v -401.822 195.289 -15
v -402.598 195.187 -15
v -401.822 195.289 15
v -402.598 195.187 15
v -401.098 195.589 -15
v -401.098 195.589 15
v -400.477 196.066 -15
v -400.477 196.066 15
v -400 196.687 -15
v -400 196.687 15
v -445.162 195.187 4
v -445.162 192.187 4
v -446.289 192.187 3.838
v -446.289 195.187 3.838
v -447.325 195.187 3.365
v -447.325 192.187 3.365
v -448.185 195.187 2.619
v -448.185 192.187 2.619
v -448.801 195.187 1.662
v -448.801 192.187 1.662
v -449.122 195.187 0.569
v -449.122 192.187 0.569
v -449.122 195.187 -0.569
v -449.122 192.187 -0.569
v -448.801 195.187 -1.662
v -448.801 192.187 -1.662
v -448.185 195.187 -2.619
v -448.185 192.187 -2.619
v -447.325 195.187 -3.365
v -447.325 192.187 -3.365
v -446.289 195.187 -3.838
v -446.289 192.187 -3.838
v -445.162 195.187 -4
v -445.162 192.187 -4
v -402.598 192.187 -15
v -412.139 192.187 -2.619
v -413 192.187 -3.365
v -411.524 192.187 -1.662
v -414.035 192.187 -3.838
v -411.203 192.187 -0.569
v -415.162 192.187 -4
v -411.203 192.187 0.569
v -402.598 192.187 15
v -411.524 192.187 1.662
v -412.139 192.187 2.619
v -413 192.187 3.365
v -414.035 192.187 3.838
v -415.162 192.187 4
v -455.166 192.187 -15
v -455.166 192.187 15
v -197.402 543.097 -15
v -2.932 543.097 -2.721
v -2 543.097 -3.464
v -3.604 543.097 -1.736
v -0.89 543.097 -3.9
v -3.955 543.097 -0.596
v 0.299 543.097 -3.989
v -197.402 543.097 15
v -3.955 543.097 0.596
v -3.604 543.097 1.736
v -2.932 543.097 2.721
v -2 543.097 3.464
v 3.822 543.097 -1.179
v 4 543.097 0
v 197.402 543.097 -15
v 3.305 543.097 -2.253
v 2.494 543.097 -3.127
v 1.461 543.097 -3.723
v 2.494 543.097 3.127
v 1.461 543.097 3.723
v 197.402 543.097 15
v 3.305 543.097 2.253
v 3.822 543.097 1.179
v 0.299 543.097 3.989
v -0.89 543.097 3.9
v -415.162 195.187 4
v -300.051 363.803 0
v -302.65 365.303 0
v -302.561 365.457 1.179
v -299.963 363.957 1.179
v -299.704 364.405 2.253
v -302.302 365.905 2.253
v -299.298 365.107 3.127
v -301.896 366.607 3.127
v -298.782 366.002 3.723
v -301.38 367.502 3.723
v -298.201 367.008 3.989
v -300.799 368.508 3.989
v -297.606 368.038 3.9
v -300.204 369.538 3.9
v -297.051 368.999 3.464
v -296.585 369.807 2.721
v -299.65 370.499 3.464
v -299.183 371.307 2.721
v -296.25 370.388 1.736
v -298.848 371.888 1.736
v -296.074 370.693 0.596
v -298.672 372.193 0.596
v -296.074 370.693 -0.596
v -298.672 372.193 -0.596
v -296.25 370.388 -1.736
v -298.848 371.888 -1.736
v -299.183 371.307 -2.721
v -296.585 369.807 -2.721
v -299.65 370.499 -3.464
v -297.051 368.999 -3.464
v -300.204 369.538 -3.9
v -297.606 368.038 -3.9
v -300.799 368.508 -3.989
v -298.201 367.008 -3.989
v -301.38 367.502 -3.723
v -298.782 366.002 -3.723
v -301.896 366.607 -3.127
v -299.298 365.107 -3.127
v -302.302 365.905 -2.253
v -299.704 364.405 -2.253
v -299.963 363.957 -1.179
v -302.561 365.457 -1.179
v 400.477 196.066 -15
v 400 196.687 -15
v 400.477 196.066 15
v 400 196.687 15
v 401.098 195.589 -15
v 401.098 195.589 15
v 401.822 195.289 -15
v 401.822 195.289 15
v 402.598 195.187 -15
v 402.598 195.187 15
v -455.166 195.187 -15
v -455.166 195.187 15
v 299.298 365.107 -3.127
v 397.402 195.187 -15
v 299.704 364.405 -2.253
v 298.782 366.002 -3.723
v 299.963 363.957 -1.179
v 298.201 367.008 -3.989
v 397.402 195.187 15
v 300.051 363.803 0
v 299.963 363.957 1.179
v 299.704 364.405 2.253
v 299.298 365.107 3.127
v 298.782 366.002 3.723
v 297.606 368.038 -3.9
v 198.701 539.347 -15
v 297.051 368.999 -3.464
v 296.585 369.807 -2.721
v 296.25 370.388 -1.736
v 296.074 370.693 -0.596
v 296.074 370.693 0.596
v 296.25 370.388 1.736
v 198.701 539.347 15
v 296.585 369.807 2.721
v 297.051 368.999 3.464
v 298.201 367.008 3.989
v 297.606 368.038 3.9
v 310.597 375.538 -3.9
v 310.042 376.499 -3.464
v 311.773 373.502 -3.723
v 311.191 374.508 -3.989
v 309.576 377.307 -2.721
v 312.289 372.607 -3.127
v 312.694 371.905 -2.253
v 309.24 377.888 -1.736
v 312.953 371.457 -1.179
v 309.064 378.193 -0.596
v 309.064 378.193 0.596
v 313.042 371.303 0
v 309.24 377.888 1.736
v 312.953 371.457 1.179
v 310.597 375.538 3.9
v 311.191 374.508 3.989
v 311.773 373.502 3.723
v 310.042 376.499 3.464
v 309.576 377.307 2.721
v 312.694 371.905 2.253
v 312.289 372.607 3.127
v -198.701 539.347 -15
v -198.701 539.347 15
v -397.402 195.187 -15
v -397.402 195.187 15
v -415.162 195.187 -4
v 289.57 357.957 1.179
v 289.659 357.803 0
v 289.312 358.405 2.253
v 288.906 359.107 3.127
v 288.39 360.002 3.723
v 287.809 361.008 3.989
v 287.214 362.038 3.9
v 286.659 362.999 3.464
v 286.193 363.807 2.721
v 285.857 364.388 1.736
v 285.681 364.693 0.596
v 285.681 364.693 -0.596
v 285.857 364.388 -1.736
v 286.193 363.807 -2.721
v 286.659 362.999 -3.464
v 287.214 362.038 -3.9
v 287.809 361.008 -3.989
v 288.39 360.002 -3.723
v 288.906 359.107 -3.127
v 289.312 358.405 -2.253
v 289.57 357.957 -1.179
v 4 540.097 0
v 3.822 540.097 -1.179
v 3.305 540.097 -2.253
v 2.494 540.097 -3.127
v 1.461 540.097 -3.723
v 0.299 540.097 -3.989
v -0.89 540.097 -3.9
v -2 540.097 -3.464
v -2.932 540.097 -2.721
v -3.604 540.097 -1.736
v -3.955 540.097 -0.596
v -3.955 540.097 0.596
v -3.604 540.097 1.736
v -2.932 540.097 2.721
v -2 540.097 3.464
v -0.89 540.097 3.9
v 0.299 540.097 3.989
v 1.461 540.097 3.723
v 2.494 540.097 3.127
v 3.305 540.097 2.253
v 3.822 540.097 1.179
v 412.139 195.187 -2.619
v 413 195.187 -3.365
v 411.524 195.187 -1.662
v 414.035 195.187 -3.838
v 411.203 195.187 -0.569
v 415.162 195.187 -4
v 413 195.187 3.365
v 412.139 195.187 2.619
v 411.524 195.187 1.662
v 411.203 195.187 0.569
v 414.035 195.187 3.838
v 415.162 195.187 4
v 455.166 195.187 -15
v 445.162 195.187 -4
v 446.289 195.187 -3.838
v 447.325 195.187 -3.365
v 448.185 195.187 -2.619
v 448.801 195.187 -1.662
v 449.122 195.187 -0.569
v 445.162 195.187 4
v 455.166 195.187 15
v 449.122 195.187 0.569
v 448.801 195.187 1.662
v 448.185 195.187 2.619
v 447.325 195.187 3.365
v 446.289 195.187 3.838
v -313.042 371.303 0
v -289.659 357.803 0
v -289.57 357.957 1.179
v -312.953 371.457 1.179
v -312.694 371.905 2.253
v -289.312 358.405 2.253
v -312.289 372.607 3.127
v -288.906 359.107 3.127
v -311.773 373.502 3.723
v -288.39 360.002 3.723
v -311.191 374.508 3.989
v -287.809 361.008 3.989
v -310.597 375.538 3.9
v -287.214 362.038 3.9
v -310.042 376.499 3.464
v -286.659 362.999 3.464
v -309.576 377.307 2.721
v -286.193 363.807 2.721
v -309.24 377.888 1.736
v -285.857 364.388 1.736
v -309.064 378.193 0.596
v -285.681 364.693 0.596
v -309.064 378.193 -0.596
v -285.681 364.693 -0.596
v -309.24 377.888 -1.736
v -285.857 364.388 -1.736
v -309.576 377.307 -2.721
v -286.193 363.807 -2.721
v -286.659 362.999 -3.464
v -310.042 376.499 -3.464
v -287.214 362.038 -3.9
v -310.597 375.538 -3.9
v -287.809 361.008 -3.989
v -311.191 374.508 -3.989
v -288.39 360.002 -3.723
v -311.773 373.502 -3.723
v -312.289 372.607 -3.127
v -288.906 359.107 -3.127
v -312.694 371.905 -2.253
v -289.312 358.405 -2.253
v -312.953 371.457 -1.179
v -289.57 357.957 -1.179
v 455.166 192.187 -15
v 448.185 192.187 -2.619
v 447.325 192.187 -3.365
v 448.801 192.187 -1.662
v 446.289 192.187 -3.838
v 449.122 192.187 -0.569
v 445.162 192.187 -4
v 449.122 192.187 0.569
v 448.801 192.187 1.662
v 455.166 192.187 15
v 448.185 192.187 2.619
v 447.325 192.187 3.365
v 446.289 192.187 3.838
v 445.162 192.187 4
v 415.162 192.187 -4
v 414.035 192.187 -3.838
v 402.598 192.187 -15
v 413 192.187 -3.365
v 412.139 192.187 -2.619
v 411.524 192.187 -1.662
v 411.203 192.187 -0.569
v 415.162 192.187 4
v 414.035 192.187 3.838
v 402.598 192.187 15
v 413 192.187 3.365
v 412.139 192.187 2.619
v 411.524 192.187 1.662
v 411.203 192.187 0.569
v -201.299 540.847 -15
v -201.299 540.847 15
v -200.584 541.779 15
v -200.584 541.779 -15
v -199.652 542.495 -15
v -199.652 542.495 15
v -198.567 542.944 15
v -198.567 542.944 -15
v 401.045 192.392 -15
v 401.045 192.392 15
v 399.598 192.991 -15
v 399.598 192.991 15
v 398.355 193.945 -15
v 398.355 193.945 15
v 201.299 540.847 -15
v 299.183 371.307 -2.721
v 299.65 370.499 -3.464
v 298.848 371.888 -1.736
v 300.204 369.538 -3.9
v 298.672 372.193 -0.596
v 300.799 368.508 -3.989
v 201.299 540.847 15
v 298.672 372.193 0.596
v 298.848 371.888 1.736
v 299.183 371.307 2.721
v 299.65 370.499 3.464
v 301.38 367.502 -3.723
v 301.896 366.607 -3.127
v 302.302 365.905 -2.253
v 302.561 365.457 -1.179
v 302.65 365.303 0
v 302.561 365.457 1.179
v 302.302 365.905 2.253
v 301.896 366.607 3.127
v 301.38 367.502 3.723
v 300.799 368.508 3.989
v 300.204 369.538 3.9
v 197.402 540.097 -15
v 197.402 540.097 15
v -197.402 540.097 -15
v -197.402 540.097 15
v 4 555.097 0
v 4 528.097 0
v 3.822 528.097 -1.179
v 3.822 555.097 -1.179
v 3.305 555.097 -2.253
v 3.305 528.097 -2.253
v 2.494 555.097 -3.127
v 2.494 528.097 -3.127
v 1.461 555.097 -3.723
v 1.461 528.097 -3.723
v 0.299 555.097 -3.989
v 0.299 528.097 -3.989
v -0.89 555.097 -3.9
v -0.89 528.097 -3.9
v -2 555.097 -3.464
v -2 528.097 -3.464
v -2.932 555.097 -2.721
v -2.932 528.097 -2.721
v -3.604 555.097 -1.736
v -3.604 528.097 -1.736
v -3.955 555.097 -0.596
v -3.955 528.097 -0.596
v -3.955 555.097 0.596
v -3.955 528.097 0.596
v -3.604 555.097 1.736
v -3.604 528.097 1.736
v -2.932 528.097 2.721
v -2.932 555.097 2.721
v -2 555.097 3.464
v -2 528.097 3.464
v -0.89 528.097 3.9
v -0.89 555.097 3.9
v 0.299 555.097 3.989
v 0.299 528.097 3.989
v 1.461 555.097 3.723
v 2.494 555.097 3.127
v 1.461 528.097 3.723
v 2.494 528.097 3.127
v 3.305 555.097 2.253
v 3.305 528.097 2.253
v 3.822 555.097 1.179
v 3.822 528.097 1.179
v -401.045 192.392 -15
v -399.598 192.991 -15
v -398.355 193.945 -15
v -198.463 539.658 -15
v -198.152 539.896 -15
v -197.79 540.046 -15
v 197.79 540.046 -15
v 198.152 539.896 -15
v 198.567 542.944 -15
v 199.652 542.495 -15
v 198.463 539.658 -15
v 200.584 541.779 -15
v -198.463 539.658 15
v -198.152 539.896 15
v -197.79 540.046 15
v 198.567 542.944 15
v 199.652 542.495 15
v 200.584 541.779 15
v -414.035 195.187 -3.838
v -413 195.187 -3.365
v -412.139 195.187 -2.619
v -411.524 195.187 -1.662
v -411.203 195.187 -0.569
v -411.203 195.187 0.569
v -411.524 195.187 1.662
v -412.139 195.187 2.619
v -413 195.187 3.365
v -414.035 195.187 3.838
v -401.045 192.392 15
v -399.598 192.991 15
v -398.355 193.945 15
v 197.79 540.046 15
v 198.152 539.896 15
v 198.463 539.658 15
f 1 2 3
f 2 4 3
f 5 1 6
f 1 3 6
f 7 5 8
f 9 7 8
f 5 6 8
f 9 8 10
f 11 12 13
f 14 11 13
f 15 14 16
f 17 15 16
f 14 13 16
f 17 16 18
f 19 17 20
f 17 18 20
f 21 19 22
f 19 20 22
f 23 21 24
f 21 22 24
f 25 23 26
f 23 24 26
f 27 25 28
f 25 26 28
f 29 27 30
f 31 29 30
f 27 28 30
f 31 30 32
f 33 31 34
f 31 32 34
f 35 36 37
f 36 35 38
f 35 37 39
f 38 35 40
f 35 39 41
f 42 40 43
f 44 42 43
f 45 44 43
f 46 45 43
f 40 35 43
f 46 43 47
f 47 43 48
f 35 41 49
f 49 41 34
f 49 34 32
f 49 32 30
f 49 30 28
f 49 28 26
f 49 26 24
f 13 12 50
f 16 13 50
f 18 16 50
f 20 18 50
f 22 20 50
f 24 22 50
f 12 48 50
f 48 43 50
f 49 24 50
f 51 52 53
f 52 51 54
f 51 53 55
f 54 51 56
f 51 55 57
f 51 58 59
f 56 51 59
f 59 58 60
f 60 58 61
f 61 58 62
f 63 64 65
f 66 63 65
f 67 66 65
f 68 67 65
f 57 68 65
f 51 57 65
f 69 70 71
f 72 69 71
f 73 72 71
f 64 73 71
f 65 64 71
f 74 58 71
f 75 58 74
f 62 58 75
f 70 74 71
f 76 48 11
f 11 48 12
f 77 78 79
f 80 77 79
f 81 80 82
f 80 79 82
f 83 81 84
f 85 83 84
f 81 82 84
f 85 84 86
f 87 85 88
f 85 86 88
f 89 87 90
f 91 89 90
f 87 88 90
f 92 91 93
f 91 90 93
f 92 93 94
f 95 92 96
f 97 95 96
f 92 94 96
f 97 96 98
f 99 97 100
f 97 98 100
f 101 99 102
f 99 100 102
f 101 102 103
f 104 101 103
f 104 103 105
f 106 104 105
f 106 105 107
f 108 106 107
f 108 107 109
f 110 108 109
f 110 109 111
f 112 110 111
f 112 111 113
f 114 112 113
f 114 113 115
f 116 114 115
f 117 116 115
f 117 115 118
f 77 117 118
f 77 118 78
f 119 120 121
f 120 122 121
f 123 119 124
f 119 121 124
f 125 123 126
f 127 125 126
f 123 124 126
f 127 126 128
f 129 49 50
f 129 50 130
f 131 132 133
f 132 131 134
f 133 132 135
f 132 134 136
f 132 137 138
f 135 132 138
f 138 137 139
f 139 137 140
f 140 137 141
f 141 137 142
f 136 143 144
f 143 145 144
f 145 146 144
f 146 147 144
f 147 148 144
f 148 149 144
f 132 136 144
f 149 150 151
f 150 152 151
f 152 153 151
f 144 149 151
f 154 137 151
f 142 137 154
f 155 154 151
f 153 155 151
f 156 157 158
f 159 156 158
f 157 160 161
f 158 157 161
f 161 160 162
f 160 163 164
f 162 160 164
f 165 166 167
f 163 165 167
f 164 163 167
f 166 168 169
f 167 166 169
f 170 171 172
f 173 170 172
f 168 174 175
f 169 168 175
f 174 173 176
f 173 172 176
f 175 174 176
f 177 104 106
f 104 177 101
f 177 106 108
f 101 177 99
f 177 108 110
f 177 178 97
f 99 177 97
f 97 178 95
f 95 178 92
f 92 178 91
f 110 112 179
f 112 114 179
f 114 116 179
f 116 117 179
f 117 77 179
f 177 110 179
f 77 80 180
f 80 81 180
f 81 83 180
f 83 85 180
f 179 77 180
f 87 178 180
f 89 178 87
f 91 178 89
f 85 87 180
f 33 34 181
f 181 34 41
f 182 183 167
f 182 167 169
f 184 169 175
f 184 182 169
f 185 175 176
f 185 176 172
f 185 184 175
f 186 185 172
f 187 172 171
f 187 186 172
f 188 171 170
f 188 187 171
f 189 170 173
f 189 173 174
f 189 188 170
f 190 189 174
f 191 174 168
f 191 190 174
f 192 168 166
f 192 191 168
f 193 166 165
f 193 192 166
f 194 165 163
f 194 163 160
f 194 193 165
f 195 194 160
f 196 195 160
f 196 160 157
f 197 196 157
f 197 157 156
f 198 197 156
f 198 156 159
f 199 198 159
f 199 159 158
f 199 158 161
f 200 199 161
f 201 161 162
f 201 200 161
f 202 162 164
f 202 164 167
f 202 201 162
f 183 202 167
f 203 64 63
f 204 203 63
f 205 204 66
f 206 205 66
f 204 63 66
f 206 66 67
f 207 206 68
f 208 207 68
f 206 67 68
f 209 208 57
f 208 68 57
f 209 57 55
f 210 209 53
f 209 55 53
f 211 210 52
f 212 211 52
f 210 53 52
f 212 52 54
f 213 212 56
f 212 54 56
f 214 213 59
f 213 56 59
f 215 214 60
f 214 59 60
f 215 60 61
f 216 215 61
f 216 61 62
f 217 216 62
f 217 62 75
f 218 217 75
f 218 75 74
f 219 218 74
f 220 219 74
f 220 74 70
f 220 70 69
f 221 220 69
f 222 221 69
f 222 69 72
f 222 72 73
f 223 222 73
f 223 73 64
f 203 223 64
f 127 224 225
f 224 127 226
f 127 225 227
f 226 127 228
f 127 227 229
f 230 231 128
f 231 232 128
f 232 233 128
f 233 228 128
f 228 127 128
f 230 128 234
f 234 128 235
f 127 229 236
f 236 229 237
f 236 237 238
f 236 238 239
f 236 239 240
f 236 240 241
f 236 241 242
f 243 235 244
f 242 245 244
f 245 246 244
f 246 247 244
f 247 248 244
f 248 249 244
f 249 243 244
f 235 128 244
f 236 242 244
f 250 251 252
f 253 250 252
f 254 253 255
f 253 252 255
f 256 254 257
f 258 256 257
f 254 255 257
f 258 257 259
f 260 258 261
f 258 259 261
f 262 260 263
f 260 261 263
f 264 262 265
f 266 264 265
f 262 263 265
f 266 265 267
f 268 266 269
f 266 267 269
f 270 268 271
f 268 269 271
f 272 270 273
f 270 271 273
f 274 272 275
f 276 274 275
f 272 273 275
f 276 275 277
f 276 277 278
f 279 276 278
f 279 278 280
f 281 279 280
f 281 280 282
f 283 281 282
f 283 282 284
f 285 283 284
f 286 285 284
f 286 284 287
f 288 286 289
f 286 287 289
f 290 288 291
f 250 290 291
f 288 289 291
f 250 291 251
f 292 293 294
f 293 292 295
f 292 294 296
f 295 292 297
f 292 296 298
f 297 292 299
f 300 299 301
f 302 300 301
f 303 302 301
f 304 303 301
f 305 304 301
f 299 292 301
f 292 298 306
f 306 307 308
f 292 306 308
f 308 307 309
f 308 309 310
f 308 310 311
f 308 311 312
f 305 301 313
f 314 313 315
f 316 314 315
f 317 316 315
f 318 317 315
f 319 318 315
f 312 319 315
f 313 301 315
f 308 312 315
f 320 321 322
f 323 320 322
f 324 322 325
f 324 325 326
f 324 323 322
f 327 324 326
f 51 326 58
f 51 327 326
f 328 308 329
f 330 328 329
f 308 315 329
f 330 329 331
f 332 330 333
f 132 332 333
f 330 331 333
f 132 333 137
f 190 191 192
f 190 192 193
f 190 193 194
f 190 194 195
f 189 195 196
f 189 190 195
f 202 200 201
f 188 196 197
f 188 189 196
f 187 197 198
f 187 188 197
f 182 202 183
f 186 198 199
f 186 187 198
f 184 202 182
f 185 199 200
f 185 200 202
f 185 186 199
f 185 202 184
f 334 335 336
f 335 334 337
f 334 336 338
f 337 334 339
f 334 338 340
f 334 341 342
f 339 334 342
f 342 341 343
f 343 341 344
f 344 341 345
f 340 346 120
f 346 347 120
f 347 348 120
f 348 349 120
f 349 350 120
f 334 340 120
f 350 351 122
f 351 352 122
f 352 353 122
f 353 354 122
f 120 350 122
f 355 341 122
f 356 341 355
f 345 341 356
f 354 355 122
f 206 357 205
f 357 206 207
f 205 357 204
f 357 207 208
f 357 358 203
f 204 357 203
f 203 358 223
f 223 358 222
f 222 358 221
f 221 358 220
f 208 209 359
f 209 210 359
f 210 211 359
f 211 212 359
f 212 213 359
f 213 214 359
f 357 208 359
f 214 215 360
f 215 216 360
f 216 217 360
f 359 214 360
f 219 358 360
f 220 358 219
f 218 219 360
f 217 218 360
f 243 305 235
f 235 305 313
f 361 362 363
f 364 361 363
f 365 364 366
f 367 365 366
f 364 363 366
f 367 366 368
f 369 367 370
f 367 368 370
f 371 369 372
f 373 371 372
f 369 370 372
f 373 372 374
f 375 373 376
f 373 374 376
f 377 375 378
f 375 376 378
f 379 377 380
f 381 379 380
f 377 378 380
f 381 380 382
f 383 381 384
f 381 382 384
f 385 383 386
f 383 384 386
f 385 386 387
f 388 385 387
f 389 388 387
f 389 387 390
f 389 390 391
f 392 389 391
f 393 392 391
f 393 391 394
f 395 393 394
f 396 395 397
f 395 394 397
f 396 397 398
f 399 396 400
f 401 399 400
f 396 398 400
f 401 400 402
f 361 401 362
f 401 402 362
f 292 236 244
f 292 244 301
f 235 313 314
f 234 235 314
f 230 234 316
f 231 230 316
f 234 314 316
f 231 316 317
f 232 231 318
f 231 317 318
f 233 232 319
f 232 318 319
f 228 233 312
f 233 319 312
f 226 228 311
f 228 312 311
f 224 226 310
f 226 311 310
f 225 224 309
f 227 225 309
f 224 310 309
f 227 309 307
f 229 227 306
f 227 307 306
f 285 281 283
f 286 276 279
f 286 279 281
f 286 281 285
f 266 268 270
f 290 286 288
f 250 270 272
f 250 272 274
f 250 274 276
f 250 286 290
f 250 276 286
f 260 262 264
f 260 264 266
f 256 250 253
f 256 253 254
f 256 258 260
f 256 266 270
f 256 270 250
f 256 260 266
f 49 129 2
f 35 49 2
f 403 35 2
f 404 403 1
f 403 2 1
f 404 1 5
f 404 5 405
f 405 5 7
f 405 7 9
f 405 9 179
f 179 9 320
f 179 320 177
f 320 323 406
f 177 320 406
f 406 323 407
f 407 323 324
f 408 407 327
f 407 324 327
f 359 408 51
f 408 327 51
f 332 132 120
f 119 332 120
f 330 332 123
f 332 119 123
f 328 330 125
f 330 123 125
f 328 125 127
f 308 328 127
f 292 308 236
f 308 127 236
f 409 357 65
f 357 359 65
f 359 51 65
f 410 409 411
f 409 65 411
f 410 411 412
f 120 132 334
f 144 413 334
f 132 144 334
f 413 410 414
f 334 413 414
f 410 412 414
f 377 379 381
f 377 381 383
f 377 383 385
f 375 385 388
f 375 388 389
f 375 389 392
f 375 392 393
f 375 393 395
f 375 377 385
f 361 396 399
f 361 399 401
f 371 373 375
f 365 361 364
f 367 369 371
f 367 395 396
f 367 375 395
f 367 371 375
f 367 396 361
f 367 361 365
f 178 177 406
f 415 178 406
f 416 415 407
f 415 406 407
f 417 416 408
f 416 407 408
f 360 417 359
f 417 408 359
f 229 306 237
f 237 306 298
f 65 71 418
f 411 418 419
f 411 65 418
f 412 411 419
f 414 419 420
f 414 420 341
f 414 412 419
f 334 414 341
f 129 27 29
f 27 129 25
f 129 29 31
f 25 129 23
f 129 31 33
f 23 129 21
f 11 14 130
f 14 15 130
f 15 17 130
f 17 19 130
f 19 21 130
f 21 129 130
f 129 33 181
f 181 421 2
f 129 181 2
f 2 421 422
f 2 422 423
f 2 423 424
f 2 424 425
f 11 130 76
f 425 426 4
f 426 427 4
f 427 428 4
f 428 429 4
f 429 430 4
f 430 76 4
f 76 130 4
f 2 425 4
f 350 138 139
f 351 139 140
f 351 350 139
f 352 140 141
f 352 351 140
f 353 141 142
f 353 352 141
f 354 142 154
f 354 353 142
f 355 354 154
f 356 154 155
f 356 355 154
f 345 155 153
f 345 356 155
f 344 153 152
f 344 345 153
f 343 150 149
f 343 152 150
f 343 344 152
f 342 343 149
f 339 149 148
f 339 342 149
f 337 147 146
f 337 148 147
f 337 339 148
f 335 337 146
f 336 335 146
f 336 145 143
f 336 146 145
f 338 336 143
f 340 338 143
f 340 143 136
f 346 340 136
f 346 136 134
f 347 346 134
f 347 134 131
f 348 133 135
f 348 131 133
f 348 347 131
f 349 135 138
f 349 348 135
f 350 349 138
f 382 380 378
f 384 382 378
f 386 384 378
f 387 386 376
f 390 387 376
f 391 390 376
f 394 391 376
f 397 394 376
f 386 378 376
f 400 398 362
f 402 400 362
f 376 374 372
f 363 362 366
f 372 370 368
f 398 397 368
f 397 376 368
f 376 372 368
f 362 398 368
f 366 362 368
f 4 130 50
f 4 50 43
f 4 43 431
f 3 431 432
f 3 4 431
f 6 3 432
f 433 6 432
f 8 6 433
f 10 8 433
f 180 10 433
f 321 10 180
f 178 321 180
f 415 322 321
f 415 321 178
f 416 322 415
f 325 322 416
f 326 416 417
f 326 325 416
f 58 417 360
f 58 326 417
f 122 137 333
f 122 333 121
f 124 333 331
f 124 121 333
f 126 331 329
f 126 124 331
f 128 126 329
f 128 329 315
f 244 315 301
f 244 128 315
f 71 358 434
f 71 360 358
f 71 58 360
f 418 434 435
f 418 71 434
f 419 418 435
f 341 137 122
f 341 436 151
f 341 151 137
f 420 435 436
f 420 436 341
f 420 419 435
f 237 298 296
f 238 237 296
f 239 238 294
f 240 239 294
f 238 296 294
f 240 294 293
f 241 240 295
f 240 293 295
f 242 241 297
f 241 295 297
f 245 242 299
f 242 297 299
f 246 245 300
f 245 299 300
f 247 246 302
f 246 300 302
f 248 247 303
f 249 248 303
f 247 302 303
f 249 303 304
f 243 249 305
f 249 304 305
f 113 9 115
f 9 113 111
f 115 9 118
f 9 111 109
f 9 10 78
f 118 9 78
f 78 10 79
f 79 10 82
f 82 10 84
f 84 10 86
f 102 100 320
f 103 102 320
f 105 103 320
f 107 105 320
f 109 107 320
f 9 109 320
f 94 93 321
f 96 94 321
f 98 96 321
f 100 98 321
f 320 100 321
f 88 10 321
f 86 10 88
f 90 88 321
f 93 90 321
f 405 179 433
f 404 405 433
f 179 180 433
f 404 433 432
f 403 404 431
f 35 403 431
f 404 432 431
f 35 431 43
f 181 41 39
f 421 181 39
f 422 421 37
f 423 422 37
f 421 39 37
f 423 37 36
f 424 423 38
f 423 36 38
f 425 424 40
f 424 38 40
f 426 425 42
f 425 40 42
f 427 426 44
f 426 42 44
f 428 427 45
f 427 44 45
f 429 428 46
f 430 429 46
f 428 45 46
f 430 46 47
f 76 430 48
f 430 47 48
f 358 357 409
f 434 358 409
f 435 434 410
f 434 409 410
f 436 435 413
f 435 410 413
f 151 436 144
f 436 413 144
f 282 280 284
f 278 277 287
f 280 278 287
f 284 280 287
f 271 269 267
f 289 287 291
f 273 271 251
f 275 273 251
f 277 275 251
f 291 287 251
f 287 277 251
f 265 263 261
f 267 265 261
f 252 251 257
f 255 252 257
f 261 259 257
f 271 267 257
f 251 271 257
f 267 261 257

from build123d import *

# Parameters (mm, degrees)
EXTRUDE_1_DEPTH        = 15
CUT_EXTRUDE_1_REACH    = 576.925
SHEET_START            = -15
SHEET_METAL_2_DEPTH    = 30
SHEET_METAL_2_2_DEPTH  = 30
EXTRUDE_2_DEPTH        = 12
EXTRUDE_2_DEPTH_BACK   = 15
SKETCH_4_R             = 4
SKETCH_4_2_R           = 4
CUT_EXTRUDE_5_DEPTH    = 900.582139681
EXTRUDE_1_2_DEPTH      = 12
EXTRUDE_1_2_DEPTH_BACK = 15
SKETCH_3_R             = 4
SKETCH_3_2_R           = 4
CUT_EXTRUDE_6_DEPTH    = 575.925257869


# Read off the part's stored shape, not the designer's step: Преобразовать-Твердое тело2
with BuildPart() as part:
    # Эскиз1 → Extrude 1 (new, symmetric)
    with BuildSketch(Plane.XY):
        with BuildLine():
            Line((-455.166025404, 195.187225691), (-402.598076211, 195.187225691))
            ThreePointArc((-402.598076211, 195.187225691), (-401.098076211, 195.58914948), (-400, 196.687225691))
            Line((-400, 196.687225691), (-200.433012702, 542.347387205))
            ThreePointArc((-200.433012702, 542.347387205), (-199.883974596, 542.896425311), (-199.133974596, 543.097387205))
            Line((-199.133974596, 543.097387205), (199.133974596, 543.097387205))
            ThreePointArc((199.133974596, 543.097387205), (199.883974596, 542.896425311), (200.433012702, 542.347387205))
            Line((200.433012702, 542.347387205), (400, 196.687225691))
            ThreePointArc((400, 196.687225691), (401.098076211, 195.58914948), (402.598076211, 195.187225691))
            Line((402.598076211, 195.187225691), (455.166025404, 195.187225691))
            Line((455.166025404, 195.187225691), (455.166025404, 192.187225691))
            Line((455.166025404, 192.187225691), (402.598076211, 192.187225691))
            ThreePointArc((402.598076211, 192.187225691), (399.598076211, 192.991073269), (397.401923789, 195.187225691))
            Line((397.401923789, 195.187225691), (198.267949192, 540.097387205))
            Line((198.267949192, 540.097387205), (-198.267949192, 540.097387205))
            Line((-198.267949192, 540.097387205), (-397.401923789, 195.187225691))
            ThreePointArc((-397.401923789, 195.187225691), (-399.598076211, 192.991073269), (-402.598076211, 192.187225691))
            Line((-402.598076211, 192.187225691), (-455.166025404, 192.187225691))
            Line((-455.166025404, 192.187225691), (-455.166025404, 195.187225691))
        make_face()
    extrude(amount=EXTRUDE_1_DEPTH, both=True)

    # Эскиз2 → Вырез-Вытянуть1 (cut, up to next)
    with BuildSketch(Plane.XZ.offset(-192.187225691), mode=Mode.PRIVATE) as cut_extrude_1_sk1:
        with BuildLine():
            Line((-445.16238786, -4), (-415.16238786, -4))
            ThreePointArc((-415.16238786, -4), (-411.16238786, 0), (-415.16238786, 4))
            Line((-415.16238786, 4), (-445.16238786, 4))
            ThreePointArc((-445.16238786, 4), (-449.16238786, 0), (-445.16238786, -4))
        make_face()
    cut_extrude_1_tool1 = extrude(cut_extrude_1_sk1.sketch, amount=-CUT_EXTRUDE_1_REACH, mode=Mode.PRIVATE) & part.part
    # Эскиз2 → Вырез-Вытянуть1 (cut, up to next)
    with BuildSketch(Plane.XZ.offset(-192.187225691), mode=Mode.PRIVATE) as cut_extrude_1_sk2:
        with BuildLine():
            Line((445.16238786, 4), (415.16238786, 4))
            ThreePointArc((415.16238786, 4), (411.16238786, 0), (415.16238786, -4))
            Line((415.16238786, -4), (445.16238786, -4))
            ThreePointArc((445.16238786, -4), (449.16238786, 0), (445.16238786, 4))
        make_face()
    cut_extrude_1_tool2 = extrude(cut_extrude_1_sk2.sketch, amount=-CUT_EXTRUDE_1_REACH, mode=Mode.PRIVATE) & part.part
    add(cut_extrude_1_tool1.solids().sort_by_distance((-430.162388, 192.187226, 0))[0], mode=Mode.SUBTRACT)
    add(cut_extrude_1_tool2.solids().sort_by_distance((430.162388, 192.187226, 0))[0], mode=Mode.SUBTRACT)

    # Sheet Metal 2 outline → Sheet Metal 2 (cut)
    with BuildSketch(Plane.XY.offset(SHEET_START)):
        with BuildLine():
            Line((199.133974596, 543.097387205), (197.401923789, 543.097387205))
            ThreePointArc((197.401923789, 543.097387205), (199.651923789, 542.494501522), (201.299038106, 540.847387205))
            Line((201.299038106, 540.847387205), (200.433012702, 542.347387205))
            ThreePointArc((200.433012702, 542.347387205), (199.883974596, 542.896425311), (199.133974596, 543.097387205))
        make_face()
        with BuildLine():
            ThreePointArc((-201.299038106, 540.847387205), (-199.651923789, 542.494501522), (-197.401923789, 543.097387205))
            Line((-197.401923789, 543.097387205), (-199.133974596, 543.097387205))
            ThreePointArc((-199.133974596, 543.097387205), (-199.883974596, 542.896425311), (-200.433012702, 542.347387205))
            Line((-200.433012702, 542.347387205), (-201.299038106, 540.847387205))
        make_face()
    extrude(amount=SHEET_METAL_2_DEPTH, mode=Mode.SUBTRACT)

    # Sheet Metal 2 2 outline → Sheet Metal 2 2 (add)
    with BuildSketch(Plane.XY.offset(SHEET_START)):
        with BuildLine():
            Line((198.267949192, 540.097387205), (197.401923789, 540.097387205))
            ThreePointArc((197.401923789, 540.097387205), (198.151923789, 539.896425311), (198.700961894, 539.347387205))
            Line((198.700961894, 539.347387205), (198.267949192, 540.097387205))
        make_face()
        with BuildLine():
            ThreePointArc((-198.700961894, 539.347387205), (-198.151923789, 539.896425311), (-197.401923789, 540.097387205))
            Line((-197.401923789, 540.097387205), (-198.267949192, 540.097387205))
            Line((-198.267949192, 540.097387205), (-198.700961894, 539.347387205))
        make_face()
    extrude(amount=SHEET_METAL_2_2_DEPTH)

    # Эскиз4<2> → Вырез-Вытянуть5 (cut, through all)
    with BuildSketch(Plane(origin=(-385.168067024, 222.37688718, 0), x_dir=(0, 0, 1), z_dir=(-0.8660254037844389, 0.49999999999999983, 0))):
        with Locations(Location((0, 169.037095943, 0), (0, 0, 270))):
            Circle(SKETCH_4_2_R)
    cut_extrude_5 = extrude(amount=-CUT_EXTRUDE_5_DEPTH, mode=Mode.SUBTRACT)

    # Эскиз3<2> → Вырез-Вытянуть6 (cut, through all)
    with BuildSketch(Plane(origin=(0, 543.097387205, 0), x_dir=(1, 0, 0), z_dir=(0, 1, 0))):
        Circle(SKETCH_3_2_R)
    extrude(amount=-CUT_EXTRUDE_6_DEPTH, mode=Mode.SUBTRACT)

    # Зеркальное отражение6: Вырез-Вытянуть5 across plane
    add(cut_extrude_5.mirror(Plane(origin=(0, 0, 0), x_dir=(0, 0, 1), z_dir=(1, 0, 0))), mode=Mode.SUBTRACT)


with BuildPart() as body_2:
    # Sketch 4 → Бобышка-Вытянуть2 (new, two sides: drawn at the far end of the back side and taken through both)
    with BuildSketch(Plane(origin=(-385.168067024, 222.37688718, 0), x_dir=(0, 0, 1), z_dir=(-0.8660254037844389, 0.49999999999999983, 0)).offset(-EXTRUDE_2_DEPTH_BACK)):
        with Locations(Location((0, 169.037095943, 0), (0, 0, 270))):
            Circle(SKETCH_4_R)
    extrude(amount=EXTRUDE_2_DEPTH + EXTRUDE_2_DEPTH_BACK)


with BuildPart() as body_3:
    # Sketch 3 → Extrude 1 2 (new, two sides: drawn at the far end of the back side and taken through both)
    with BuildSketch(Plane(origin=(0, 543.097387205, 0), x_dir=(1, 0, 0), z_dir=(0, 1, 0)).offset(-EXTRUDE_1_2_DEPTH_BACK)):
        Circle(SKETCH_3_R)
    extrude(amount=EXTRUDE_1_2_DEPTH + EXTRUDE_1_2_DEPTH_BACK)


with BuildPart() as body_4:
    # Зеркальное отражение5: mirrored copy
    add(body_2.part.mirror(Plane(origin=(0, 0, 0), x_dir=(0, 0, 1), z_dir=(1, 0, 0))))


solid = Compound([part.part, body_2.part, body_3.part, body_4.part])
